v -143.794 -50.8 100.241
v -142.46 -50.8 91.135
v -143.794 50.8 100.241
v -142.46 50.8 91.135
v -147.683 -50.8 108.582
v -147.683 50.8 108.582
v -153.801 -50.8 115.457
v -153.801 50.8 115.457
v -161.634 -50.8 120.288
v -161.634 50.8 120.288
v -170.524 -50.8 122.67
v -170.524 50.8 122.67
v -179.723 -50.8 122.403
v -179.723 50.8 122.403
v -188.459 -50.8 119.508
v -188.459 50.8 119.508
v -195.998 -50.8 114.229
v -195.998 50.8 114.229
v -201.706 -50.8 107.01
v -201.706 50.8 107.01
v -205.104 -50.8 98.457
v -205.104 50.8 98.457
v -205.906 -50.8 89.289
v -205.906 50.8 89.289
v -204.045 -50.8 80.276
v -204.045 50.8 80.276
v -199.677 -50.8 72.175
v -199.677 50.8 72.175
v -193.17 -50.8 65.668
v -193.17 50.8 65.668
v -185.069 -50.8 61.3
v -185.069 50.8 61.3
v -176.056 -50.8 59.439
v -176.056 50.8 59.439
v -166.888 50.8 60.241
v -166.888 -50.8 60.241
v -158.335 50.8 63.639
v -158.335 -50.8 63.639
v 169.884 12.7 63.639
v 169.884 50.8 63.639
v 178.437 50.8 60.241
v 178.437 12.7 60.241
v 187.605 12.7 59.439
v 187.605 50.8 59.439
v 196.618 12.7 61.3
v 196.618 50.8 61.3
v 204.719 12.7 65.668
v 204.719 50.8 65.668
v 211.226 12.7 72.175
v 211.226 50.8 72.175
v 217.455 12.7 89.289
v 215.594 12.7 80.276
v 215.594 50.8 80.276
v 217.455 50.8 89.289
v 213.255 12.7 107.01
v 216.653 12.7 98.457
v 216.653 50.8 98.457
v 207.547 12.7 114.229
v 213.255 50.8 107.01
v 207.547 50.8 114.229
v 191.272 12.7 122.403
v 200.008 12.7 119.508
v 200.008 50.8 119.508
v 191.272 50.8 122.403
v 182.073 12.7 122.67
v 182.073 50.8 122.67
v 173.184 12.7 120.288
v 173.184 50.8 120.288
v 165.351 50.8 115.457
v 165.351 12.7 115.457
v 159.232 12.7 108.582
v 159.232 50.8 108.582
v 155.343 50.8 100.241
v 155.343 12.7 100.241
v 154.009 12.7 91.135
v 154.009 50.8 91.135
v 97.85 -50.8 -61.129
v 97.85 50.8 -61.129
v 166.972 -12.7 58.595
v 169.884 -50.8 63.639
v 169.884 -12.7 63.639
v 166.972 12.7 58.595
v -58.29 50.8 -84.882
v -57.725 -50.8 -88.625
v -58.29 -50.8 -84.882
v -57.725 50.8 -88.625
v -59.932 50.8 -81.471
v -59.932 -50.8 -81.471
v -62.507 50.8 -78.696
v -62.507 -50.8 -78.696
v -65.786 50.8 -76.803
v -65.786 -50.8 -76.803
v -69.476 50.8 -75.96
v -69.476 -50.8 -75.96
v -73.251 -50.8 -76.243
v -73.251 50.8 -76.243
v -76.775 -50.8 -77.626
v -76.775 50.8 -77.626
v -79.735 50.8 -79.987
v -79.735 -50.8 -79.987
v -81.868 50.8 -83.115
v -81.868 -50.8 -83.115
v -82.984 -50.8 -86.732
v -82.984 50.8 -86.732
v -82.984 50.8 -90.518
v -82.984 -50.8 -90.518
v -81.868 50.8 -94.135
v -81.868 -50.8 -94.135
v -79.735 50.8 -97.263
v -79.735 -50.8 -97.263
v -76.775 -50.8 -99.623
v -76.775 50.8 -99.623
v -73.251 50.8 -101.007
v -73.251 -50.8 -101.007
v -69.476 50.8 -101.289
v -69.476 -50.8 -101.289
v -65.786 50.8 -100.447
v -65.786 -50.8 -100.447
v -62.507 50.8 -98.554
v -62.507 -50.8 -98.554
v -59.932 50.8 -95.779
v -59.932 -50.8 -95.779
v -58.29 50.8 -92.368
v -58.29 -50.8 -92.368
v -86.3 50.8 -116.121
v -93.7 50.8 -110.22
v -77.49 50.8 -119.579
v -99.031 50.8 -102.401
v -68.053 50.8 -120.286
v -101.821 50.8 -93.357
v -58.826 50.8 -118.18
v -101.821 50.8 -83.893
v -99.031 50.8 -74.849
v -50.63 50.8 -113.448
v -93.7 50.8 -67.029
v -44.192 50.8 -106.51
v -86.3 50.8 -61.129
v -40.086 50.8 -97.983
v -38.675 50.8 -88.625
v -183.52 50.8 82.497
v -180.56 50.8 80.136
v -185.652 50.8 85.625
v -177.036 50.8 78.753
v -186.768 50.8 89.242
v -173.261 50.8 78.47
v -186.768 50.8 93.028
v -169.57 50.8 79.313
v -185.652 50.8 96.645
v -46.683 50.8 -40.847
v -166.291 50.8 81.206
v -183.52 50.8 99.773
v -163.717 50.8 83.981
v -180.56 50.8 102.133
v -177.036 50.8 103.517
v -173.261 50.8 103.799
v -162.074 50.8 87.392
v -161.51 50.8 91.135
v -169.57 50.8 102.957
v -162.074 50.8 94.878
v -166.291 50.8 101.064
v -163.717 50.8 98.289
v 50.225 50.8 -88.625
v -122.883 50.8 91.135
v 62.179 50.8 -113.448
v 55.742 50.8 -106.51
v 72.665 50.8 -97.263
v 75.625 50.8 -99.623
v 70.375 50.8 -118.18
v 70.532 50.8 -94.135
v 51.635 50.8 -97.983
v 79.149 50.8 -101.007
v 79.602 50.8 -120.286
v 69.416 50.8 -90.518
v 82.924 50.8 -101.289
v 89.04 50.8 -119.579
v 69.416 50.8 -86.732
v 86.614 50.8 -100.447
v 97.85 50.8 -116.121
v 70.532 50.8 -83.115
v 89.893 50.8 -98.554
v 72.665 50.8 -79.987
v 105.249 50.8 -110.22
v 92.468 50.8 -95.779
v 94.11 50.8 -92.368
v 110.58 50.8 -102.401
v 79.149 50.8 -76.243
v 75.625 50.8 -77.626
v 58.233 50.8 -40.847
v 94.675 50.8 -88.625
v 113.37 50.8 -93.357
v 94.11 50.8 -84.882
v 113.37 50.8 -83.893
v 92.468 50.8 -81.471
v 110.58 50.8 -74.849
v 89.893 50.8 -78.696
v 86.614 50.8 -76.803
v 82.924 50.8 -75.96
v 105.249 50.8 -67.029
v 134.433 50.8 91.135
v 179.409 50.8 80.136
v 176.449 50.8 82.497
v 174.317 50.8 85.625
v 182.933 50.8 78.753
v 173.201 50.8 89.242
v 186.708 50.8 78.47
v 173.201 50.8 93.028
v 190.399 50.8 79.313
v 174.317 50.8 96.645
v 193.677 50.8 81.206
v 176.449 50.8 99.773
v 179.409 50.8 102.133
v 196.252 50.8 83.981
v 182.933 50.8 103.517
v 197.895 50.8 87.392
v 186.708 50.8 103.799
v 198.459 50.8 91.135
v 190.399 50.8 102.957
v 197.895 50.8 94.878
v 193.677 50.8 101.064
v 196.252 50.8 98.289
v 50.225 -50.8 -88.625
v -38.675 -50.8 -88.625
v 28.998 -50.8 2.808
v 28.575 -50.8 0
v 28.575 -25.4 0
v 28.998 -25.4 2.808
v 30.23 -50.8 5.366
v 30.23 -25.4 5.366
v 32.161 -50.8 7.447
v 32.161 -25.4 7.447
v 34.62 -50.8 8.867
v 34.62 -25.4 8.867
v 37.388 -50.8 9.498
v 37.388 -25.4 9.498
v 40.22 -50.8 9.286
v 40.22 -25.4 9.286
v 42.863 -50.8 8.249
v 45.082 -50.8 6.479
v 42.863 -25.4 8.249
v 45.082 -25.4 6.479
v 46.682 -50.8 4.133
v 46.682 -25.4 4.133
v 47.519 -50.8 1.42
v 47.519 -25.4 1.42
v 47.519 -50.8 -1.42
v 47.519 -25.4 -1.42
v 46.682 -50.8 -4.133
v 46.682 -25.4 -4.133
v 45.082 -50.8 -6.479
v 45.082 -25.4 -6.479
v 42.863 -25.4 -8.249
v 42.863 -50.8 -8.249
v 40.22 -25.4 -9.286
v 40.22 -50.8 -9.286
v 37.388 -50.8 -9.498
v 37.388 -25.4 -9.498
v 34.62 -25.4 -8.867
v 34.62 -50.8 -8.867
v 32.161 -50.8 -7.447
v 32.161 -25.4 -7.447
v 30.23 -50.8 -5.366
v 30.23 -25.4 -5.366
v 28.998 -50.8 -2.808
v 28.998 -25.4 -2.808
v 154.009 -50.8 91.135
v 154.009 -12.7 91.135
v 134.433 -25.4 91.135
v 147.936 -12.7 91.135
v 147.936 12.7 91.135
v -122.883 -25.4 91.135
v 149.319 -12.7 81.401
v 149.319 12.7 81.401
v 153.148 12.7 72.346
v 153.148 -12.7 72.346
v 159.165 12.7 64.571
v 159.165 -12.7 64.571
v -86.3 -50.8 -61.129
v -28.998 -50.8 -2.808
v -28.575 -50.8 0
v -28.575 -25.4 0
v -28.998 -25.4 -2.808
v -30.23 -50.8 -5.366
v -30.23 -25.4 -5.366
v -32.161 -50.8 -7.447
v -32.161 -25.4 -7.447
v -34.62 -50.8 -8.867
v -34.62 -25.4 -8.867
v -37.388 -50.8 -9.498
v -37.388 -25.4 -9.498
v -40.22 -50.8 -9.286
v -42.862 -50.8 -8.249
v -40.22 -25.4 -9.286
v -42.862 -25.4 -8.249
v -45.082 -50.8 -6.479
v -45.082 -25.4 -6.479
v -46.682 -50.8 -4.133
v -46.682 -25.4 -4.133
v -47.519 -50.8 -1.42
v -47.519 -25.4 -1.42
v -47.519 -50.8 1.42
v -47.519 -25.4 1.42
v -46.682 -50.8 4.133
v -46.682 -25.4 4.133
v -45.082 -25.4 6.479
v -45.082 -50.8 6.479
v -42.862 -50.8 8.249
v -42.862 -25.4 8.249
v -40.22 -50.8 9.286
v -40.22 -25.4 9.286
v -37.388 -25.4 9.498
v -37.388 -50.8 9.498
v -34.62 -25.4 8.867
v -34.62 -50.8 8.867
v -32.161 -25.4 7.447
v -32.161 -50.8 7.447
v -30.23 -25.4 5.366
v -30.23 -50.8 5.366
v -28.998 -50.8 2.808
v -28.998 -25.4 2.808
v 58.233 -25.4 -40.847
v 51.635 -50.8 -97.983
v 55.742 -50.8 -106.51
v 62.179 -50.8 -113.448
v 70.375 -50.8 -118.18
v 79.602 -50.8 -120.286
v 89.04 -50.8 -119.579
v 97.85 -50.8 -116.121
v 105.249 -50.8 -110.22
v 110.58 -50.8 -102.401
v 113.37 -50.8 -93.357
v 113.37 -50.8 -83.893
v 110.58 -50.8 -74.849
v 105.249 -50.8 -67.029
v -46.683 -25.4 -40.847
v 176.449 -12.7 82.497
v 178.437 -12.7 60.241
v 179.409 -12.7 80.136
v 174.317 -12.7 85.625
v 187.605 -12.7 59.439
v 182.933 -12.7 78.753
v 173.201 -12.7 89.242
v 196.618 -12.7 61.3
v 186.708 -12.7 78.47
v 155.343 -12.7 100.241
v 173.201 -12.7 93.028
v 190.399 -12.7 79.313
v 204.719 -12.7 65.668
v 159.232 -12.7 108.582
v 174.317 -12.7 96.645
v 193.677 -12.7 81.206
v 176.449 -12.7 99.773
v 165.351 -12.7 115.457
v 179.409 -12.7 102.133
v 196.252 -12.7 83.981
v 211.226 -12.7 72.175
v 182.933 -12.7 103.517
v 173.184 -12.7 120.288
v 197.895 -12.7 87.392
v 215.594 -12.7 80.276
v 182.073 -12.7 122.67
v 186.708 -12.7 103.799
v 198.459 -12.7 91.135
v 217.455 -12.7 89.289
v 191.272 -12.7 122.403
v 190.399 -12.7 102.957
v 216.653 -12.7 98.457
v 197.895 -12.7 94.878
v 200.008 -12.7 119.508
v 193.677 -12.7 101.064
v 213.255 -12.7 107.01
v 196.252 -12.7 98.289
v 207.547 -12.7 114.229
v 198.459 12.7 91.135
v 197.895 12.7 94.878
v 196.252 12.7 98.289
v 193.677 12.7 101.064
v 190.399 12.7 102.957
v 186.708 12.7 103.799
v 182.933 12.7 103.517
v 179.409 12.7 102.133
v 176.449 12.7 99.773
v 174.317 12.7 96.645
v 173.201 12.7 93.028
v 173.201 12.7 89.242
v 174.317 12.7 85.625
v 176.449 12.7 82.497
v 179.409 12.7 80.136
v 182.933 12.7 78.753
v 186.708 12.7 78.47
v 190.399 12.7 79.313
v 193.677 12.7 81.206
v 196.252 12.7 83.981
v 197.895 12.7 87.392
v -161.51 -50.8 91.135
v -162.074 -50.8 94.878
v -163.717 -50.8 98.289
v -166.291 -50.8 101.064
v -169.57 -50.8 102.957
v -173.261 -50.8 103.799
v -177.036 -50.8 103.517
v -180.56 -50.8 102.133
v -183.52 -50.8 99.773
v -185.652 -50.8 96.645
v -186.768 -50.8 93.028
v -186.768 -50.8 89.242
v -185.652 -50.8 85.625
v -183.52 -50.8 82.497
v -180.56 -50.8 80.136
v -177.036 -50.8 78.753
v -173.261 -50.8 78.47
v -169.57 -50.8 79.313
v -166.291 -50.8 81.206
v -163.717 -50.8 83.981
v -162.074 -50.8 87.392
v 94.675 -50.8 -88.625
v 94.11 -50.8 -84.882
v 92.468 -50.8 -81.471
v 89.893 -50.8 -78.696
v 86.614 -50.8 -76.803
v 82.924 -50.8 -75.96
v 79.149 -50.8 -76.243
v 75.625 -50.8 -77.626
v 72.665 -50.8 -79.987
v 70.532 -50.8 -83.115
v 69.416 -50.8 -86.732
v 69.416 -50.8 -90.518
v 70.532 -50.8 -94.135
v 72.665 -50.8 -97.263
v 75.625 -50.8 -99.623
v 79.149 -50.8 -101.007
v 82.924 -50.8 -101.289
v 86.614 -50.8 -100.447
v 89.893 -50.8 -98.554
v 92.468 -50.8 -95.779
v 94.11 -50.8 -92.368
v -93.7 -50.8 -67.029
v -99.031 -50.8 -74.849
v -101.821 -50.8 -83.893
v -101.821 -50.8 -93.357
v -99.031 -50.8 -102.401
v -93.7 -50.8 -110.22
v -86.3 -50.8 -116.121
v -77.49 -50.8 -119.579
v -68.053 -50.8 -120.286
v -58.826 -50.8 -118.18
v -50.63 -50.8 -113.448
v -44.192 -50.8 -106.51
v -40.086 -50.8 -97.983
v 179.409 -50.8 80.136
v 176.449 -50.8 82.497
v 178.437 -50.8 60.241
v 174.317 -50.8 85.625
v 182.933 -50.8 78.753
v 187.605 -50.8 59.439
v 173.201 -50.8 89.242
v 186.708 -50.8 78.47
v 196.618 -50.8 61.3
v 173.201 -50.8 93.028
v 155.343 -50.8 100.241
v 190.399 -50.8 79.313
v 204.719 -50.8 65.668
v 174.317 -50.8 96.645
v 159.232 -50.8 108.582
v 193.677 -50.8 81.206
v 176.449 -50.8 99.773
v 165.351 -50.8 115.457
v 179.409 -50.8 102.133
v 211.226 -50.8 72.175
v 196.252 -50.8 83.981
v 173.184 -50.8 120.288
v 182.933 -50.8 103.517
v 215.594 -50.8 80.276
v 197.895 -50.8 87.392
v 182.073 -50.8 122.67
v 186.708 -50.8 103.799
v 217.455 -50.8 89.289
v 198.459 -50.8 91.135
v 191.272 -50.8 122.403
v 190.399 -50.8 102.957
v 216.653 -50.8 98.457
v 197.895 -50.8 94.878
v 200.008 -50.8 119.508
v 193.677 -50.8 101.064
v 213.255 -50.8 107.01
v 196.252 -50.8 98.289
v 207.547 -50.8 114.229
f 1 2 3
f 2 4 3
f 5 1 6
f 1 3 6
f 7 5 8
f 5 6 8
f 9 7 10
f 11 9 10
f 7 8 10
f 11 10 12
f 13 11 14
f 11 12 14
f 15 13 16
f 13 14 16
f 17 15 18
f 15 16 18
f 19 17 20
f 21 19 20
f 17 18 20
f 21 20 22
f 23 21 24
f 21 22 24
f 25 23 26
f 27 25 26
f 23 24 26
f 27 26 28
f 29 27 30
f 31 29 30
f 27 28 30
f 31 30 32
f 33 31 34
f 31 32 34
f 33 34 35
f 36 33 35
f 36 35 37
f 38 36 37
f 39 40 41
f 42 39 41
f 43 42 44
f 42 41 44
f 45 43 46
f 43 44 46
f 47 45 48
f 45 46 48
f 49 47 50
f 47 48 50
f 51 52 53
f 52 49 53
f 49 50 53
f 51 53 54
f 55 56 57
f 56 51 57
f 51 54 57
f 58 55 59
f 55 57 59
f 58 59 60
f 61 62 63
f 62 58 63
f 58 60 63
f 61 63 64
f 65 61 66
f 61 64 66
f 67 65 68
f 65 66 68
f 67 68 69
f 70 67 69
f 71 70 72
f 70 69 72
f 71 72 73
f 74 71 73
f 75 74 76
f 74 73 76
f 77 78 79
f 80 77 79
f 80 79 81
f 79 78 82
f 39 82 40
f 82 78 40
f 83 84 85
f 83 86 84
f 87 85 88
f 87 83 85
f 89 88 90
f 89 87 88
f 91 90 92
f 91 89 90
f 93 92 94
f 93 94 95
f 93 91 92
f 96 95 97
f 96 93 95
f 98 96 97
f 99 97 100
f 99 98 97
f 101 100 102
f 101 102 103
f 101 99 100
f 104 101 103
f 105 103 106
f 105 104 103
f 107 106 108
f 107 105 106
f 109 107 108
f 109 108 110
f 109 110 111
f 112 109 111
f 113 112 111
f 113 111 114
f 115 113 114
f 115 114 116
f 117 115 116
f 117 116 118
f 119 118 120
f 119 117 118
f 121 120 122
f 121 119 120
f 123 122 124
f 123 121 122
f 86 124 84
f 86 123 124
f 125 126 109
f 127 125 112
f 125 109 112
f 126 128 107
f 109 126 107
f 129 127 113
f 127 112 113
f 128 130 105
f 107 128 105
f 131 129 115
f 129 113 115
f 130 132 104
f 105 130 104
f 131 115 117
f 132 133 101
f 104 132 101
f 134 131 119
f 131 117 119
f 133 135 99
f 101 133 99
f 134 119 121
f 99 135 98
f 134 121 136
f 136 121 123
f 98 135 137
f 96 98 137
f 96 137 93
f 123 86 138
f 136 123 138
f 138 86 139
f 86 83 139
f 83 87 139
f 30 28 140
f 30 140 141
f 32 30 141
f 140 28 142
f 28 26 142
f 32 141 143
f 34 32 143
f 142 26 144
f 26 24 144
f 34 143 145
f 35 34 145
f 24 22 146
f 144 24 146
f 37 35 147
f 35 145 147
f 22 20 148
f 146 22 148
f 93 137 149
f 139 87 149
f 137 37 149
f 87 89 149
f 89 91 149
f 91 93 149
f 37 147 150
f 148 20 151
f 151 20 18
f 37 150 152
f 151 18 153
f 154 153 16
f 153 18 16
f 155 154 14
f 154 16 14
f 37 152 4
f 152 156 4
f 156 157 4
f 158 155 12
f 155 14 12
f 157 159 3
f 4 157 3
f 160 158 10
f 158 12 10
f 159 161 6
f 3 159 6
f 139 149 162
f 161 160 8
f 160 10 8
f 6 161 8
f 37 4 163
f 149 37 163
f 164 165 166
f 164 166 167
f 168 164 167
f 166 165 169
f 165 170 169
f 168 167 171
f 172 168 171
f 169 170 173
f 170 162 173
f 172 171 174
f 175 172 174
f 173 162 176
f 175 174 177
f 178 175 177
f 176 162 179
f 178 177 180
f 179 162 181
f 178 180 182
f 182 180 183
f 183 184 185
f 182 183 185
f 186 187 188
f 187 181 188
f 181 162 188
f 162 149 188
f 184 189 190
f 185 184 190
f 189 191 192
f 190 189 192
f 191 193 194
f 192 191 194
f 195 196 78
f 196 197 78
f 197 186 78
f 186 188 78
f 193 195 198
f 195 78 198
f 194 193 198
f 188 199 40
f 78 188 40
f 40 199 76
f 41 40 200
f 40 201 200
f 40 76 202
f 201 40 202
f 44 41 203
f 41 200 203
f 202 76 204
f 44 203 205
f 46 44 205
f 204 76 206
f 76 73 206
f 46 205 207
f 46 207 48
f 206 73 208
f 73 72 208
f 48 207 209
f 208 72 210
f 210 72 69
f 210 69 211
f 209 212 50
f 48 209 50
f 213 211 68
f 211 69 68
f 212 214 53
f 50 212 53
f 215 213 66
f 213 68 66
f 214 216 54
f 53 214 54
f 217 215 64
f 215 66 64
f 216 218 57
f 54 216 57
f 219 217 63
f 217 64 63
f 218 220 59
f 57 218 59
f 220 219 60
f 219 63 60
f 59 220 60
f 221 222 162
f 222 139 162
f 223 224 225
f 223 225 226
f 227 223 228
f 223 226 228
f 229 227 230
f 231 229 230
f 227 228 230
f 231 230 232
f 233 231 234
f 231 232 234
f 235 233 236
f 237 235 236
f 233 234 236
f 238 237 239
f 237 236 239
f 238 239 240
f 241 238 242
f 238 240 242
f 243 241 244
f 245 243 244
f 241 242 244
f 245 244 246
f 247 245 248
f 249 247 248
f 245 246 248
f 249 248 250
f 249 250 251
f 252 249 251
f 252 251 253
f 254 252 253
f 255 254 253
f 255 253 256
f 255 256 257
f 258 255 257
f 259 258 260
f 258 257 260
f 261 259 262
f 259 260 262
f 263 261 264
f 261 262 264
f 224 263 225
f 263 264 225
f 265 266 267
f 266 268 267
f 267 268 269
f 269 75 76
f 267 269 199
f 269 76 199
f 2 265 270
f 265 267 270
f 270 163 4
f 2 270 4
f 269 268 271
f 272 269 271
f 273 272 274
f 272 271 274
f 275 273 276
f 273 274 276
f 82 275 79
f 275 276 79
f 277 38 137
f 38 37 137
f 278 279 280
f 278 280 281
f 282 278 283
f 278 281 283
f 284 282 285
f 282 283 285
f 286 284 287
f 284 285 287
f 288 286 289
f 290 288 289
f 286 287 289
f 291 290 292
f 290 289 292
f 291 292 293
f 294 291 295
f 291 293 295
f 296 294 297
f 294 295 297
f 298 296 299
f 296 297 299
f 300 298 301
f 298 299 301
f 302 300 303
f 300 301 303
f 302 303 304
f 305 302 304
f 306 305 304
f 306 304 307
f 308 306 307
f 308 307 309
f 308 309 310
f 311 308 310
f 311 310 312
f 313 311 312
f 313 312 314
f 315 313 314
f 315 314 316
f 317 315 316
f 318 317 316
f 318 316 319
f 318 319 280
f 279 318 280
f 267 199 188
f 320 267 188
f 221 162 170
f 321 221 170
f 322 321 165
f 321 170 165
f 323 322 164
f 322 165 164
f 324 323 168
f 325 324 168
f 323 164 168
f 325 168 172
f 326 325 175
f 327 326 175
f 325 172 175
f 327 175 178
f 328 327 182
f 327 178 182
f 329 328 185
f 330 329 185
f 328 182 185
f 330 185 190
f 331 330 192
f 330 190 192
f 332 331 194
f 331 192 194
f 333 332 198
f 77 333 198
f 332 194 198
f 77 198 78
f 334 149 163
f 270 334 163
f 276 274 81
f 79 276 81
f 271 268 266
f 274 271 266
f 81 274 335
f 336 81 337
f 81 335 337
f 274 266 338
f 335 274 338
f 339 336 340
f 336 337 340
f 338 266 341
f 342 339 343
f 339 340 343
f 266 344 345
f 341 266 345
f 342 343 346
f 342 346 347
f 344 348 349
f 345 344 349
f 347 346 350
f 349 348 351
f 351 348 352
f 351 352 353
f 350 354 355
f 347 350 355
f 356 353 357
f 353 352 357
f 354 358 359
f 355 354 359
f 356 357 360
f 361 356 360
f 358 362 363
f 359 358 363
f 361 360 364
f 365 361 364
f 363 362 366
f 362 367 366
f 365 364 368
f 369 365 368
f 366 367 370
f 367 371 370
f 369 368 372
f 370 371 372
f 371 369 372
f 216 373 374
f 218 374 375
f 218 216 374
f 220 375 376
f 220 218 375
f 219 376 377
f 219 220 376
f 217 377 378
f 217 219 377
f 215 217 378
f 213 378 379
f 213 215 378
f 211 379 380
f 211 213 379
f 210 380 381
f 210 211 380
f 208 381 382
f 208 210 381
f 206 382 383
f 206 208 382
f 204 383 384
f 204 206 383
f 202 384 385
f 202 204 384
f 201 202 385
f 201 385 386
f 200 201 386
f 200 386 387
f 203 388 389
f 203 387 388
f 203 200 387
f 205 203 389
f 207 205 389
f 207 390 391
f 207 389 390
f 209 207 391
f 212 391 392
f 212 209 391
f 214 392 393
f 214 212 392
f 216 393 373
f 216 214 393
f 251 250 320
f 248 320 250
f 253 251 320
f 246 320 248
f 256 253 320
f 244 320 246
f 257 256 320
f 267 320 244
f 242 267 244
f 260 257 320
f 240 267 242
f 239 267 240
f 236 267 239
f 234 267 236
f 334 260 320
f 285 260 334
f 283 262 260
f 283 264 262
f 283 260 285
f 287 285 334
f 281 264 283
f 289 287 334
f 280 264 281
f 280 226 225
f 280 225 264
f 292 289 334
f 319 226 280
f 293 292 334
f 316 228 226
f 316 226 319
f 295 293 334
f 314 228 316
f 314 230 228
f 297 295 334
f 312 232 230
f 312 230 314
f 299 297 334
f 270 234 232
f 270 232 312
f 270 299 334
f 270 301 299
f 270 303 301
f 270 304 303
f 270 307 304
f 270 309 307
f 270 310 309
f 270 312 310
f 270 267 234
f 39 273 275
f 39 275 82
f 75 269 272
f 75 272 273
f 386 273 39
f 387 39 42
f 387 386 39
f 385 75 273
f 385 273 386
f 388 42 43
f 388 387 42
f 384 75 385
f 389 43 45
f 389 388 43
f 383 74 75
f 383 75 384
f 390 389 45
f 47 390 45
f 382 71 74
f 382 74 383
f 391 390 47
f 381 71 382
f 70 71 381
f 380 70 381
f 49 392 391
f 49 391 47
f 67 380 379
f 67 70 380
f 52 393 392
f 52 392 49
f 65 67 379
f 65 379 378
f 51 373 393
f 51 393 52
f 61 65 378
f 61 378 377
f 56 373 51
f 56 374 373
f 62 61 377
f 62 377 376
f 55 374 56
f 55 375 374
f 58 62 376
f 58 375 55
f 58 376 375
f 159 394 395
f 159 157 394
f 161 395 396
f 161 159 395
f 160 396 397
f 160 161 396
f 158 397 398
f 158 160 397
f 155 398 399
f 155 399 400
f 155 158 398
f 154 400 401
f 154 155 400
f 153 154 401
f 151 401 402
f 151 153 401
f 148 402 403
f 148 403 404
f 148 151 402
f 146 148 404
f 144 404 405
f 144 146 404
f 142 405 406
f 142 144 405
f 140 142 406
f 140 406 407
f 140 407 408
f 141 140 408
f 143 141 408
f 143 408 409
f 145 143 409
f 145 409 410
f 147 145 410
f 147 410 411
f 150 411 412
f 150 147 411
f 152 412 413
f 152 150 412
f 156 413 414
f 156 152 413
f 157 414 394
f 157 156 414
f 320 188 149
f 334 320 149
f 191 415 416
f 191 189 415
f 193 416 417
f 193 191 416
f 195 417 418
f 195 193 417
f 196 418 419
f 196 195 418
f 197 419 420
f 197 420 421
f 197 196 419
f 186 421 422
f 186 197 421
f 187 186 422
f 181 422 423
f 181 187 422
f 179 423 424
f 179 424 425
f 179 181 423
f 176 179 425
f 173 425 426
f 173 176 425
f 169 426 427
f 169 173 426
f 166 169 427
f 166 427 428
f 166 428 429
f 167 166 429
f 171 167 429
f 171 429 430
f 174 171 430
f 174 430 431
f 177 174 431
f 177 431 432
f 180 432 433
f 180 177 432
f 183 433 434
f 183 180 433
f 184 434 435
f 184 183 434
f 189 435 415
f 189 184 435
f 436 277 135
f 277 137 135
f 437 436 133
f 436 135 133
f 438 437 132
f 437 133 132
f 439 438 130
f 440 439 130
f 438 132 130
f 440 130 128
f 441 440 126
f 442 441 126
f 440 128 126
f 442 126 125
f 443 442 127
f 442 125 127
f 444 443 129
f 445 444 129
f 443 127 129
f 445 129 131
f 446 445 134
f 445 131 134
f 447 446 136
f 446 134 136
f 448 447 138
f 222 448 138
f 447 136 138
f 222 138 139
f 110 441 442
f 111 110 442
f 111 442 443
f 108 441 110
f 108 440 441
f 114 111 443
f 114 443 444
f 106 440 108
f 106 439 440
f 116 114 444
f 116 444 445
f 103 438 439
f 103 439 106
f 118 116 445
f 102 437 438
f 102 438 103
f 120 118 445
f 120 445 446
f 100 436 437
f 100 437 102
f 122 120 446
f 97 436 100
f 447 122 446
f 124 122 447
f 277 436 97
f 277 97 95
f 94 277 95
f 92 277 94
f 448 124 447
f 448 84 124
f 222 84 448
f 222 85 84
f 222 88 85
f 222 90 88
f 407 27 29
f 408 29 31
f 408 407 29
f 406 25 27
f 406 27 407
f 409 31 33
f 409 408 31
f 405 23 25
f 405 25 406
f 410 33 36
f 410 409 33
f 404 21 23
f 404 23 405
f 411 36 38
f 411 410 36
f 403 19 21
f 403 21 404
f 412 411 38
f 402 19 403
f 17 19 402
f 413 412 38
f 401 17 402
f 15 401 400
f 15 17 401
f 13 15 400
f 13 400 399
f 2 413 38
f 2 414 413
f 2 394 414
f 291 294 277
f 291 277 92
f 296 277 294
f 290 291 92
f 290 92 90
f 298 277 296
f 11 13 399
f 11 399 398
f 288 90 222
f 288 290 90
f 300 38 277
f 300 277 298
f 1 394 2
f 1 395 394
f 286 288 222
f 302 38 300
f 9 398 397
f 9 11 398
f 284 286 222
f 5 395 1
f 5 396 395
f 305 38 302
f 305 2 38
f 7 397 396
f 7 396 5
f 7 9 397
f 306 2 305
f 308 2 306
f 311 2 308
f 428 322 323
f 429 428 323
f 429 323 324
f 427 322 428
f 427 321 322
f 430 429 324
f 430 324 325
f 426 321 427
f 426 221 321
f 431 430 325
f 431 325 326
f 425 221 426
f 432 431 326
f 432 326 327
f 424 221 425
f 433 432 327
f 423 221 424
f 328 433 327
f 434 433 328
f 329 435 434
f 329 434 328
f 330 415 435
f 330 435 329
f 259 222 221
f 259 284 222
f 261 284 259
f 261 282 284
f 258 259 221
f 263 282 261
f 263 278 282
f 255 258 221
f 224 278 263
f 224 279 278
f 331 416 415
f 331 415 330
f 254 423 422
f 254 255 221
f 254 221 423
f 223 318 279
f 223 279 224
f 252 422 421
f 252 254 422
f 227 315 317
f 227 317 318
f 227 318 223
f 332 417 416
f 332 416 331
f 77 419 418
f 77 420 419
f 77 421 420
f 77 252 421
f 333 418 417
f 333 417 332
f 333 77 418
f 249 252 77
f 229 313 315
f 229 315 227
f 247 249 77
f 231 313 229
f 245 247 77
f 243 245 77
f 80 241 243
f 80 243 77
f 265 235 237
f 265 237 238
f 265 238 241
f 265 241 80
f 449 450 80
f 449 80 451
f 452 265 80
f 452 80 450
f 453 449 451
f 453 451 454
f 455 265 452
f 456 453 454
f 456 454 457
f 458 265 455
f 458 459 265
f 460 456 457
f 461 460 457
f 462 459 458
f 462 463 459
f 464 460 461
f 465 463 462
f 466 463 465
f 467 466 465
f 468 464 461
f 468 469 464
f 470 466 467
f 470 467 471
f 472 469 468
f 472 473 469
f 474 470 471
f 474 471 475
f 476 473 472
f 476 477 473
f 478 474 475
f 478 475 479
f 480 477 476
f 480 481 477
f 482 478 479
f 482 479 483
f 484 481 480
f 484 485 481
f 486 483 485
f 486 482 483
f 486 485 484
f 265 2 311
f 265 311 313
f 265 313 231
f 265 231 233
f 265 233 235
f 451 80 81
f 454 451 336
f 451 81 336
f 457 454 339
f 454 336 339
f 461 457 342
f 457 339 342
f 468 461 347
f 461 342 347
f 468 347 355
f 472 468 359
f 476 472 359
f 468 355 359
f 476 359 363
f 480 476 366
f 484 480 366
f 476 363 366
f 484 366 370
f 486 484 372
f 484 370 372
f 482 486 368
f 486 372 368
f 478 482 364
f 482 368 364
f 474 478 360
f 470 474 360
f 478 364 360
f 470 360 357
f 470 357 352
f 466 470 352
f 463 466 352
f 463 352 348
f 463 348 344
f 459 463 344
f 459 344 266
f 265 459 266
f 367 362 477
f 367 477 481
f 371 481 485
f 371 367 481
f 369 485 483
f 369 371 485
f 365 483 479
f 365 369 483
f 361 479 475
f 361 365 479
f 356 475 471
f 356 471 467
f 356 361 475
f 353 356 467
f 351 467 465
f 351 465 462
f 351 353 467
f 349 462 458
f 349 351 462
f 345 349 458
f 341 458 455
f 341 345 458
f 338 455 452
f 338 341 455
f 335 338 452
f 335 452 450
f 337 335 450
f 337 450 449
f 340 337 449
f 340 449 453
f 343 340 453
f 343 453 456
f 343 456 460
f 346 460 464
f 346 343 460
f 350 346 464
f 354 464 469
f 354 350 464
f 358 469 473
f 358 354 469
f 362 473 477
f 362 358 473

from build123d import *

# Parameters (mm, degrees)
F0_R     = 12.7
F1_DEPTH = 50.8
F3_DEPTH = 76.2
F4_R     = 38.1
F5_DEPTH = 12.7
F6_R     = 9.525
F7_DEPTH = 42.418


# Not quite as in the source:
# - the program builds the solid bodies; features that only make, move or delete a surface that nothing else refers to are left out


with BuildPart() as f1:
    # F0 (on Front) → F1 (new body, symmetric)
    with BuildSketch(Plane.XZ):
        with BuildLine():
            Line((154.00903388, 91.1349219612), (-142.45976612, 91.1349219612))
            ThreePointArc((-142.45976612, 91.1349219612), (-201.7060726901, 107.0099219612), (-158.33476612, 63.638615391))
            Line((-158.33476612, 63.638615391), (-86.30036612, -61.1286253017))
            ThreePointArc((-86.30036612, -61.1286253017), (-86.30036612, -116.121238442), (-38.67536612, -88.6249318719))
            Line((-38.67536612, -88.6249318719), (50.22463388, -88.6249318719))
            ThreePointArc((50.22463388, -88.6249318719), (97.84963388, -116.121238442), (97.84963388, -61.1286253017))
            Line((97.84963388, -61.1286253017), (169.88403388, 63.638615391))
            ThreePointArc((169.88403388, 63.638615391), (213.2553404502, 107.0099219612), (154.00903388, 91.1349219612))
        make_face()
        with Locations((-70.42536612, -88.6249318719)):
            Circle(F0_R, mode=Mode.SUBTRACT)
        with Locations((81.97463388, -88.6249318719)):
            Circle(F0_R, mode=Mode.SUBTRACT)
        with Locations((-174.20976612, 91.1349219612)):
            Circle(F0_R, mode=Mode.SUBTRACT)
        with Locations((185.75903388, 91.1349219612)):
            Circle(F0_R, mode=Mode.SUBTRACT)
    extrude(amount=-F1_DEPTH, both=True)

    # F2 (on face) → F3 (cut)
    with BuildSketch(Plane(origin=(0, 50.8, 0), x_dir=(-1, 0, 0), z_dir=(0, 1, 0))):
        Polygon((122.883327189, 91.1349219612), (-134.4325949491, 91.1349219612), (-58.2325949491, -40.8473495756), (46.683327189, -40.8473495756), align=None)
    extrude(amount=-F3_DEPTH, mode=Mode.SUBTRACT)

    # F4 (on Front) → F5 (cut, symmetric)
    with BuildSketch(Plane.XZ):
        with Locations((186.0332787037, 91.5846452117)):
            Circle(F4_R)
    extrude(amount=F5_DEPTH, both=True, mode=Mode.SUBTRACT)

    # F6 (on face) → F7 (cut, symmetric)
    with BuildSketch(Plane(origin=(0, -25.4, 0), x_dir=(-1, 0, 0), z_dir=(0, 1, 0))):
        with BuildLine():
            ThreePointArc((47.625, 0), (38.1, 9.525), (28.575, 0))
            ThreePointArc((28.575, 0), (38.1, -9.525), (47.625, 0))
        make_face()
        with Locations((-38.1, 0)):
            Circle(F6_R)
    extrude(amount=F7_DEPTH, both=True, mode=Mode.SUBTRACT)


solid = f1.part
